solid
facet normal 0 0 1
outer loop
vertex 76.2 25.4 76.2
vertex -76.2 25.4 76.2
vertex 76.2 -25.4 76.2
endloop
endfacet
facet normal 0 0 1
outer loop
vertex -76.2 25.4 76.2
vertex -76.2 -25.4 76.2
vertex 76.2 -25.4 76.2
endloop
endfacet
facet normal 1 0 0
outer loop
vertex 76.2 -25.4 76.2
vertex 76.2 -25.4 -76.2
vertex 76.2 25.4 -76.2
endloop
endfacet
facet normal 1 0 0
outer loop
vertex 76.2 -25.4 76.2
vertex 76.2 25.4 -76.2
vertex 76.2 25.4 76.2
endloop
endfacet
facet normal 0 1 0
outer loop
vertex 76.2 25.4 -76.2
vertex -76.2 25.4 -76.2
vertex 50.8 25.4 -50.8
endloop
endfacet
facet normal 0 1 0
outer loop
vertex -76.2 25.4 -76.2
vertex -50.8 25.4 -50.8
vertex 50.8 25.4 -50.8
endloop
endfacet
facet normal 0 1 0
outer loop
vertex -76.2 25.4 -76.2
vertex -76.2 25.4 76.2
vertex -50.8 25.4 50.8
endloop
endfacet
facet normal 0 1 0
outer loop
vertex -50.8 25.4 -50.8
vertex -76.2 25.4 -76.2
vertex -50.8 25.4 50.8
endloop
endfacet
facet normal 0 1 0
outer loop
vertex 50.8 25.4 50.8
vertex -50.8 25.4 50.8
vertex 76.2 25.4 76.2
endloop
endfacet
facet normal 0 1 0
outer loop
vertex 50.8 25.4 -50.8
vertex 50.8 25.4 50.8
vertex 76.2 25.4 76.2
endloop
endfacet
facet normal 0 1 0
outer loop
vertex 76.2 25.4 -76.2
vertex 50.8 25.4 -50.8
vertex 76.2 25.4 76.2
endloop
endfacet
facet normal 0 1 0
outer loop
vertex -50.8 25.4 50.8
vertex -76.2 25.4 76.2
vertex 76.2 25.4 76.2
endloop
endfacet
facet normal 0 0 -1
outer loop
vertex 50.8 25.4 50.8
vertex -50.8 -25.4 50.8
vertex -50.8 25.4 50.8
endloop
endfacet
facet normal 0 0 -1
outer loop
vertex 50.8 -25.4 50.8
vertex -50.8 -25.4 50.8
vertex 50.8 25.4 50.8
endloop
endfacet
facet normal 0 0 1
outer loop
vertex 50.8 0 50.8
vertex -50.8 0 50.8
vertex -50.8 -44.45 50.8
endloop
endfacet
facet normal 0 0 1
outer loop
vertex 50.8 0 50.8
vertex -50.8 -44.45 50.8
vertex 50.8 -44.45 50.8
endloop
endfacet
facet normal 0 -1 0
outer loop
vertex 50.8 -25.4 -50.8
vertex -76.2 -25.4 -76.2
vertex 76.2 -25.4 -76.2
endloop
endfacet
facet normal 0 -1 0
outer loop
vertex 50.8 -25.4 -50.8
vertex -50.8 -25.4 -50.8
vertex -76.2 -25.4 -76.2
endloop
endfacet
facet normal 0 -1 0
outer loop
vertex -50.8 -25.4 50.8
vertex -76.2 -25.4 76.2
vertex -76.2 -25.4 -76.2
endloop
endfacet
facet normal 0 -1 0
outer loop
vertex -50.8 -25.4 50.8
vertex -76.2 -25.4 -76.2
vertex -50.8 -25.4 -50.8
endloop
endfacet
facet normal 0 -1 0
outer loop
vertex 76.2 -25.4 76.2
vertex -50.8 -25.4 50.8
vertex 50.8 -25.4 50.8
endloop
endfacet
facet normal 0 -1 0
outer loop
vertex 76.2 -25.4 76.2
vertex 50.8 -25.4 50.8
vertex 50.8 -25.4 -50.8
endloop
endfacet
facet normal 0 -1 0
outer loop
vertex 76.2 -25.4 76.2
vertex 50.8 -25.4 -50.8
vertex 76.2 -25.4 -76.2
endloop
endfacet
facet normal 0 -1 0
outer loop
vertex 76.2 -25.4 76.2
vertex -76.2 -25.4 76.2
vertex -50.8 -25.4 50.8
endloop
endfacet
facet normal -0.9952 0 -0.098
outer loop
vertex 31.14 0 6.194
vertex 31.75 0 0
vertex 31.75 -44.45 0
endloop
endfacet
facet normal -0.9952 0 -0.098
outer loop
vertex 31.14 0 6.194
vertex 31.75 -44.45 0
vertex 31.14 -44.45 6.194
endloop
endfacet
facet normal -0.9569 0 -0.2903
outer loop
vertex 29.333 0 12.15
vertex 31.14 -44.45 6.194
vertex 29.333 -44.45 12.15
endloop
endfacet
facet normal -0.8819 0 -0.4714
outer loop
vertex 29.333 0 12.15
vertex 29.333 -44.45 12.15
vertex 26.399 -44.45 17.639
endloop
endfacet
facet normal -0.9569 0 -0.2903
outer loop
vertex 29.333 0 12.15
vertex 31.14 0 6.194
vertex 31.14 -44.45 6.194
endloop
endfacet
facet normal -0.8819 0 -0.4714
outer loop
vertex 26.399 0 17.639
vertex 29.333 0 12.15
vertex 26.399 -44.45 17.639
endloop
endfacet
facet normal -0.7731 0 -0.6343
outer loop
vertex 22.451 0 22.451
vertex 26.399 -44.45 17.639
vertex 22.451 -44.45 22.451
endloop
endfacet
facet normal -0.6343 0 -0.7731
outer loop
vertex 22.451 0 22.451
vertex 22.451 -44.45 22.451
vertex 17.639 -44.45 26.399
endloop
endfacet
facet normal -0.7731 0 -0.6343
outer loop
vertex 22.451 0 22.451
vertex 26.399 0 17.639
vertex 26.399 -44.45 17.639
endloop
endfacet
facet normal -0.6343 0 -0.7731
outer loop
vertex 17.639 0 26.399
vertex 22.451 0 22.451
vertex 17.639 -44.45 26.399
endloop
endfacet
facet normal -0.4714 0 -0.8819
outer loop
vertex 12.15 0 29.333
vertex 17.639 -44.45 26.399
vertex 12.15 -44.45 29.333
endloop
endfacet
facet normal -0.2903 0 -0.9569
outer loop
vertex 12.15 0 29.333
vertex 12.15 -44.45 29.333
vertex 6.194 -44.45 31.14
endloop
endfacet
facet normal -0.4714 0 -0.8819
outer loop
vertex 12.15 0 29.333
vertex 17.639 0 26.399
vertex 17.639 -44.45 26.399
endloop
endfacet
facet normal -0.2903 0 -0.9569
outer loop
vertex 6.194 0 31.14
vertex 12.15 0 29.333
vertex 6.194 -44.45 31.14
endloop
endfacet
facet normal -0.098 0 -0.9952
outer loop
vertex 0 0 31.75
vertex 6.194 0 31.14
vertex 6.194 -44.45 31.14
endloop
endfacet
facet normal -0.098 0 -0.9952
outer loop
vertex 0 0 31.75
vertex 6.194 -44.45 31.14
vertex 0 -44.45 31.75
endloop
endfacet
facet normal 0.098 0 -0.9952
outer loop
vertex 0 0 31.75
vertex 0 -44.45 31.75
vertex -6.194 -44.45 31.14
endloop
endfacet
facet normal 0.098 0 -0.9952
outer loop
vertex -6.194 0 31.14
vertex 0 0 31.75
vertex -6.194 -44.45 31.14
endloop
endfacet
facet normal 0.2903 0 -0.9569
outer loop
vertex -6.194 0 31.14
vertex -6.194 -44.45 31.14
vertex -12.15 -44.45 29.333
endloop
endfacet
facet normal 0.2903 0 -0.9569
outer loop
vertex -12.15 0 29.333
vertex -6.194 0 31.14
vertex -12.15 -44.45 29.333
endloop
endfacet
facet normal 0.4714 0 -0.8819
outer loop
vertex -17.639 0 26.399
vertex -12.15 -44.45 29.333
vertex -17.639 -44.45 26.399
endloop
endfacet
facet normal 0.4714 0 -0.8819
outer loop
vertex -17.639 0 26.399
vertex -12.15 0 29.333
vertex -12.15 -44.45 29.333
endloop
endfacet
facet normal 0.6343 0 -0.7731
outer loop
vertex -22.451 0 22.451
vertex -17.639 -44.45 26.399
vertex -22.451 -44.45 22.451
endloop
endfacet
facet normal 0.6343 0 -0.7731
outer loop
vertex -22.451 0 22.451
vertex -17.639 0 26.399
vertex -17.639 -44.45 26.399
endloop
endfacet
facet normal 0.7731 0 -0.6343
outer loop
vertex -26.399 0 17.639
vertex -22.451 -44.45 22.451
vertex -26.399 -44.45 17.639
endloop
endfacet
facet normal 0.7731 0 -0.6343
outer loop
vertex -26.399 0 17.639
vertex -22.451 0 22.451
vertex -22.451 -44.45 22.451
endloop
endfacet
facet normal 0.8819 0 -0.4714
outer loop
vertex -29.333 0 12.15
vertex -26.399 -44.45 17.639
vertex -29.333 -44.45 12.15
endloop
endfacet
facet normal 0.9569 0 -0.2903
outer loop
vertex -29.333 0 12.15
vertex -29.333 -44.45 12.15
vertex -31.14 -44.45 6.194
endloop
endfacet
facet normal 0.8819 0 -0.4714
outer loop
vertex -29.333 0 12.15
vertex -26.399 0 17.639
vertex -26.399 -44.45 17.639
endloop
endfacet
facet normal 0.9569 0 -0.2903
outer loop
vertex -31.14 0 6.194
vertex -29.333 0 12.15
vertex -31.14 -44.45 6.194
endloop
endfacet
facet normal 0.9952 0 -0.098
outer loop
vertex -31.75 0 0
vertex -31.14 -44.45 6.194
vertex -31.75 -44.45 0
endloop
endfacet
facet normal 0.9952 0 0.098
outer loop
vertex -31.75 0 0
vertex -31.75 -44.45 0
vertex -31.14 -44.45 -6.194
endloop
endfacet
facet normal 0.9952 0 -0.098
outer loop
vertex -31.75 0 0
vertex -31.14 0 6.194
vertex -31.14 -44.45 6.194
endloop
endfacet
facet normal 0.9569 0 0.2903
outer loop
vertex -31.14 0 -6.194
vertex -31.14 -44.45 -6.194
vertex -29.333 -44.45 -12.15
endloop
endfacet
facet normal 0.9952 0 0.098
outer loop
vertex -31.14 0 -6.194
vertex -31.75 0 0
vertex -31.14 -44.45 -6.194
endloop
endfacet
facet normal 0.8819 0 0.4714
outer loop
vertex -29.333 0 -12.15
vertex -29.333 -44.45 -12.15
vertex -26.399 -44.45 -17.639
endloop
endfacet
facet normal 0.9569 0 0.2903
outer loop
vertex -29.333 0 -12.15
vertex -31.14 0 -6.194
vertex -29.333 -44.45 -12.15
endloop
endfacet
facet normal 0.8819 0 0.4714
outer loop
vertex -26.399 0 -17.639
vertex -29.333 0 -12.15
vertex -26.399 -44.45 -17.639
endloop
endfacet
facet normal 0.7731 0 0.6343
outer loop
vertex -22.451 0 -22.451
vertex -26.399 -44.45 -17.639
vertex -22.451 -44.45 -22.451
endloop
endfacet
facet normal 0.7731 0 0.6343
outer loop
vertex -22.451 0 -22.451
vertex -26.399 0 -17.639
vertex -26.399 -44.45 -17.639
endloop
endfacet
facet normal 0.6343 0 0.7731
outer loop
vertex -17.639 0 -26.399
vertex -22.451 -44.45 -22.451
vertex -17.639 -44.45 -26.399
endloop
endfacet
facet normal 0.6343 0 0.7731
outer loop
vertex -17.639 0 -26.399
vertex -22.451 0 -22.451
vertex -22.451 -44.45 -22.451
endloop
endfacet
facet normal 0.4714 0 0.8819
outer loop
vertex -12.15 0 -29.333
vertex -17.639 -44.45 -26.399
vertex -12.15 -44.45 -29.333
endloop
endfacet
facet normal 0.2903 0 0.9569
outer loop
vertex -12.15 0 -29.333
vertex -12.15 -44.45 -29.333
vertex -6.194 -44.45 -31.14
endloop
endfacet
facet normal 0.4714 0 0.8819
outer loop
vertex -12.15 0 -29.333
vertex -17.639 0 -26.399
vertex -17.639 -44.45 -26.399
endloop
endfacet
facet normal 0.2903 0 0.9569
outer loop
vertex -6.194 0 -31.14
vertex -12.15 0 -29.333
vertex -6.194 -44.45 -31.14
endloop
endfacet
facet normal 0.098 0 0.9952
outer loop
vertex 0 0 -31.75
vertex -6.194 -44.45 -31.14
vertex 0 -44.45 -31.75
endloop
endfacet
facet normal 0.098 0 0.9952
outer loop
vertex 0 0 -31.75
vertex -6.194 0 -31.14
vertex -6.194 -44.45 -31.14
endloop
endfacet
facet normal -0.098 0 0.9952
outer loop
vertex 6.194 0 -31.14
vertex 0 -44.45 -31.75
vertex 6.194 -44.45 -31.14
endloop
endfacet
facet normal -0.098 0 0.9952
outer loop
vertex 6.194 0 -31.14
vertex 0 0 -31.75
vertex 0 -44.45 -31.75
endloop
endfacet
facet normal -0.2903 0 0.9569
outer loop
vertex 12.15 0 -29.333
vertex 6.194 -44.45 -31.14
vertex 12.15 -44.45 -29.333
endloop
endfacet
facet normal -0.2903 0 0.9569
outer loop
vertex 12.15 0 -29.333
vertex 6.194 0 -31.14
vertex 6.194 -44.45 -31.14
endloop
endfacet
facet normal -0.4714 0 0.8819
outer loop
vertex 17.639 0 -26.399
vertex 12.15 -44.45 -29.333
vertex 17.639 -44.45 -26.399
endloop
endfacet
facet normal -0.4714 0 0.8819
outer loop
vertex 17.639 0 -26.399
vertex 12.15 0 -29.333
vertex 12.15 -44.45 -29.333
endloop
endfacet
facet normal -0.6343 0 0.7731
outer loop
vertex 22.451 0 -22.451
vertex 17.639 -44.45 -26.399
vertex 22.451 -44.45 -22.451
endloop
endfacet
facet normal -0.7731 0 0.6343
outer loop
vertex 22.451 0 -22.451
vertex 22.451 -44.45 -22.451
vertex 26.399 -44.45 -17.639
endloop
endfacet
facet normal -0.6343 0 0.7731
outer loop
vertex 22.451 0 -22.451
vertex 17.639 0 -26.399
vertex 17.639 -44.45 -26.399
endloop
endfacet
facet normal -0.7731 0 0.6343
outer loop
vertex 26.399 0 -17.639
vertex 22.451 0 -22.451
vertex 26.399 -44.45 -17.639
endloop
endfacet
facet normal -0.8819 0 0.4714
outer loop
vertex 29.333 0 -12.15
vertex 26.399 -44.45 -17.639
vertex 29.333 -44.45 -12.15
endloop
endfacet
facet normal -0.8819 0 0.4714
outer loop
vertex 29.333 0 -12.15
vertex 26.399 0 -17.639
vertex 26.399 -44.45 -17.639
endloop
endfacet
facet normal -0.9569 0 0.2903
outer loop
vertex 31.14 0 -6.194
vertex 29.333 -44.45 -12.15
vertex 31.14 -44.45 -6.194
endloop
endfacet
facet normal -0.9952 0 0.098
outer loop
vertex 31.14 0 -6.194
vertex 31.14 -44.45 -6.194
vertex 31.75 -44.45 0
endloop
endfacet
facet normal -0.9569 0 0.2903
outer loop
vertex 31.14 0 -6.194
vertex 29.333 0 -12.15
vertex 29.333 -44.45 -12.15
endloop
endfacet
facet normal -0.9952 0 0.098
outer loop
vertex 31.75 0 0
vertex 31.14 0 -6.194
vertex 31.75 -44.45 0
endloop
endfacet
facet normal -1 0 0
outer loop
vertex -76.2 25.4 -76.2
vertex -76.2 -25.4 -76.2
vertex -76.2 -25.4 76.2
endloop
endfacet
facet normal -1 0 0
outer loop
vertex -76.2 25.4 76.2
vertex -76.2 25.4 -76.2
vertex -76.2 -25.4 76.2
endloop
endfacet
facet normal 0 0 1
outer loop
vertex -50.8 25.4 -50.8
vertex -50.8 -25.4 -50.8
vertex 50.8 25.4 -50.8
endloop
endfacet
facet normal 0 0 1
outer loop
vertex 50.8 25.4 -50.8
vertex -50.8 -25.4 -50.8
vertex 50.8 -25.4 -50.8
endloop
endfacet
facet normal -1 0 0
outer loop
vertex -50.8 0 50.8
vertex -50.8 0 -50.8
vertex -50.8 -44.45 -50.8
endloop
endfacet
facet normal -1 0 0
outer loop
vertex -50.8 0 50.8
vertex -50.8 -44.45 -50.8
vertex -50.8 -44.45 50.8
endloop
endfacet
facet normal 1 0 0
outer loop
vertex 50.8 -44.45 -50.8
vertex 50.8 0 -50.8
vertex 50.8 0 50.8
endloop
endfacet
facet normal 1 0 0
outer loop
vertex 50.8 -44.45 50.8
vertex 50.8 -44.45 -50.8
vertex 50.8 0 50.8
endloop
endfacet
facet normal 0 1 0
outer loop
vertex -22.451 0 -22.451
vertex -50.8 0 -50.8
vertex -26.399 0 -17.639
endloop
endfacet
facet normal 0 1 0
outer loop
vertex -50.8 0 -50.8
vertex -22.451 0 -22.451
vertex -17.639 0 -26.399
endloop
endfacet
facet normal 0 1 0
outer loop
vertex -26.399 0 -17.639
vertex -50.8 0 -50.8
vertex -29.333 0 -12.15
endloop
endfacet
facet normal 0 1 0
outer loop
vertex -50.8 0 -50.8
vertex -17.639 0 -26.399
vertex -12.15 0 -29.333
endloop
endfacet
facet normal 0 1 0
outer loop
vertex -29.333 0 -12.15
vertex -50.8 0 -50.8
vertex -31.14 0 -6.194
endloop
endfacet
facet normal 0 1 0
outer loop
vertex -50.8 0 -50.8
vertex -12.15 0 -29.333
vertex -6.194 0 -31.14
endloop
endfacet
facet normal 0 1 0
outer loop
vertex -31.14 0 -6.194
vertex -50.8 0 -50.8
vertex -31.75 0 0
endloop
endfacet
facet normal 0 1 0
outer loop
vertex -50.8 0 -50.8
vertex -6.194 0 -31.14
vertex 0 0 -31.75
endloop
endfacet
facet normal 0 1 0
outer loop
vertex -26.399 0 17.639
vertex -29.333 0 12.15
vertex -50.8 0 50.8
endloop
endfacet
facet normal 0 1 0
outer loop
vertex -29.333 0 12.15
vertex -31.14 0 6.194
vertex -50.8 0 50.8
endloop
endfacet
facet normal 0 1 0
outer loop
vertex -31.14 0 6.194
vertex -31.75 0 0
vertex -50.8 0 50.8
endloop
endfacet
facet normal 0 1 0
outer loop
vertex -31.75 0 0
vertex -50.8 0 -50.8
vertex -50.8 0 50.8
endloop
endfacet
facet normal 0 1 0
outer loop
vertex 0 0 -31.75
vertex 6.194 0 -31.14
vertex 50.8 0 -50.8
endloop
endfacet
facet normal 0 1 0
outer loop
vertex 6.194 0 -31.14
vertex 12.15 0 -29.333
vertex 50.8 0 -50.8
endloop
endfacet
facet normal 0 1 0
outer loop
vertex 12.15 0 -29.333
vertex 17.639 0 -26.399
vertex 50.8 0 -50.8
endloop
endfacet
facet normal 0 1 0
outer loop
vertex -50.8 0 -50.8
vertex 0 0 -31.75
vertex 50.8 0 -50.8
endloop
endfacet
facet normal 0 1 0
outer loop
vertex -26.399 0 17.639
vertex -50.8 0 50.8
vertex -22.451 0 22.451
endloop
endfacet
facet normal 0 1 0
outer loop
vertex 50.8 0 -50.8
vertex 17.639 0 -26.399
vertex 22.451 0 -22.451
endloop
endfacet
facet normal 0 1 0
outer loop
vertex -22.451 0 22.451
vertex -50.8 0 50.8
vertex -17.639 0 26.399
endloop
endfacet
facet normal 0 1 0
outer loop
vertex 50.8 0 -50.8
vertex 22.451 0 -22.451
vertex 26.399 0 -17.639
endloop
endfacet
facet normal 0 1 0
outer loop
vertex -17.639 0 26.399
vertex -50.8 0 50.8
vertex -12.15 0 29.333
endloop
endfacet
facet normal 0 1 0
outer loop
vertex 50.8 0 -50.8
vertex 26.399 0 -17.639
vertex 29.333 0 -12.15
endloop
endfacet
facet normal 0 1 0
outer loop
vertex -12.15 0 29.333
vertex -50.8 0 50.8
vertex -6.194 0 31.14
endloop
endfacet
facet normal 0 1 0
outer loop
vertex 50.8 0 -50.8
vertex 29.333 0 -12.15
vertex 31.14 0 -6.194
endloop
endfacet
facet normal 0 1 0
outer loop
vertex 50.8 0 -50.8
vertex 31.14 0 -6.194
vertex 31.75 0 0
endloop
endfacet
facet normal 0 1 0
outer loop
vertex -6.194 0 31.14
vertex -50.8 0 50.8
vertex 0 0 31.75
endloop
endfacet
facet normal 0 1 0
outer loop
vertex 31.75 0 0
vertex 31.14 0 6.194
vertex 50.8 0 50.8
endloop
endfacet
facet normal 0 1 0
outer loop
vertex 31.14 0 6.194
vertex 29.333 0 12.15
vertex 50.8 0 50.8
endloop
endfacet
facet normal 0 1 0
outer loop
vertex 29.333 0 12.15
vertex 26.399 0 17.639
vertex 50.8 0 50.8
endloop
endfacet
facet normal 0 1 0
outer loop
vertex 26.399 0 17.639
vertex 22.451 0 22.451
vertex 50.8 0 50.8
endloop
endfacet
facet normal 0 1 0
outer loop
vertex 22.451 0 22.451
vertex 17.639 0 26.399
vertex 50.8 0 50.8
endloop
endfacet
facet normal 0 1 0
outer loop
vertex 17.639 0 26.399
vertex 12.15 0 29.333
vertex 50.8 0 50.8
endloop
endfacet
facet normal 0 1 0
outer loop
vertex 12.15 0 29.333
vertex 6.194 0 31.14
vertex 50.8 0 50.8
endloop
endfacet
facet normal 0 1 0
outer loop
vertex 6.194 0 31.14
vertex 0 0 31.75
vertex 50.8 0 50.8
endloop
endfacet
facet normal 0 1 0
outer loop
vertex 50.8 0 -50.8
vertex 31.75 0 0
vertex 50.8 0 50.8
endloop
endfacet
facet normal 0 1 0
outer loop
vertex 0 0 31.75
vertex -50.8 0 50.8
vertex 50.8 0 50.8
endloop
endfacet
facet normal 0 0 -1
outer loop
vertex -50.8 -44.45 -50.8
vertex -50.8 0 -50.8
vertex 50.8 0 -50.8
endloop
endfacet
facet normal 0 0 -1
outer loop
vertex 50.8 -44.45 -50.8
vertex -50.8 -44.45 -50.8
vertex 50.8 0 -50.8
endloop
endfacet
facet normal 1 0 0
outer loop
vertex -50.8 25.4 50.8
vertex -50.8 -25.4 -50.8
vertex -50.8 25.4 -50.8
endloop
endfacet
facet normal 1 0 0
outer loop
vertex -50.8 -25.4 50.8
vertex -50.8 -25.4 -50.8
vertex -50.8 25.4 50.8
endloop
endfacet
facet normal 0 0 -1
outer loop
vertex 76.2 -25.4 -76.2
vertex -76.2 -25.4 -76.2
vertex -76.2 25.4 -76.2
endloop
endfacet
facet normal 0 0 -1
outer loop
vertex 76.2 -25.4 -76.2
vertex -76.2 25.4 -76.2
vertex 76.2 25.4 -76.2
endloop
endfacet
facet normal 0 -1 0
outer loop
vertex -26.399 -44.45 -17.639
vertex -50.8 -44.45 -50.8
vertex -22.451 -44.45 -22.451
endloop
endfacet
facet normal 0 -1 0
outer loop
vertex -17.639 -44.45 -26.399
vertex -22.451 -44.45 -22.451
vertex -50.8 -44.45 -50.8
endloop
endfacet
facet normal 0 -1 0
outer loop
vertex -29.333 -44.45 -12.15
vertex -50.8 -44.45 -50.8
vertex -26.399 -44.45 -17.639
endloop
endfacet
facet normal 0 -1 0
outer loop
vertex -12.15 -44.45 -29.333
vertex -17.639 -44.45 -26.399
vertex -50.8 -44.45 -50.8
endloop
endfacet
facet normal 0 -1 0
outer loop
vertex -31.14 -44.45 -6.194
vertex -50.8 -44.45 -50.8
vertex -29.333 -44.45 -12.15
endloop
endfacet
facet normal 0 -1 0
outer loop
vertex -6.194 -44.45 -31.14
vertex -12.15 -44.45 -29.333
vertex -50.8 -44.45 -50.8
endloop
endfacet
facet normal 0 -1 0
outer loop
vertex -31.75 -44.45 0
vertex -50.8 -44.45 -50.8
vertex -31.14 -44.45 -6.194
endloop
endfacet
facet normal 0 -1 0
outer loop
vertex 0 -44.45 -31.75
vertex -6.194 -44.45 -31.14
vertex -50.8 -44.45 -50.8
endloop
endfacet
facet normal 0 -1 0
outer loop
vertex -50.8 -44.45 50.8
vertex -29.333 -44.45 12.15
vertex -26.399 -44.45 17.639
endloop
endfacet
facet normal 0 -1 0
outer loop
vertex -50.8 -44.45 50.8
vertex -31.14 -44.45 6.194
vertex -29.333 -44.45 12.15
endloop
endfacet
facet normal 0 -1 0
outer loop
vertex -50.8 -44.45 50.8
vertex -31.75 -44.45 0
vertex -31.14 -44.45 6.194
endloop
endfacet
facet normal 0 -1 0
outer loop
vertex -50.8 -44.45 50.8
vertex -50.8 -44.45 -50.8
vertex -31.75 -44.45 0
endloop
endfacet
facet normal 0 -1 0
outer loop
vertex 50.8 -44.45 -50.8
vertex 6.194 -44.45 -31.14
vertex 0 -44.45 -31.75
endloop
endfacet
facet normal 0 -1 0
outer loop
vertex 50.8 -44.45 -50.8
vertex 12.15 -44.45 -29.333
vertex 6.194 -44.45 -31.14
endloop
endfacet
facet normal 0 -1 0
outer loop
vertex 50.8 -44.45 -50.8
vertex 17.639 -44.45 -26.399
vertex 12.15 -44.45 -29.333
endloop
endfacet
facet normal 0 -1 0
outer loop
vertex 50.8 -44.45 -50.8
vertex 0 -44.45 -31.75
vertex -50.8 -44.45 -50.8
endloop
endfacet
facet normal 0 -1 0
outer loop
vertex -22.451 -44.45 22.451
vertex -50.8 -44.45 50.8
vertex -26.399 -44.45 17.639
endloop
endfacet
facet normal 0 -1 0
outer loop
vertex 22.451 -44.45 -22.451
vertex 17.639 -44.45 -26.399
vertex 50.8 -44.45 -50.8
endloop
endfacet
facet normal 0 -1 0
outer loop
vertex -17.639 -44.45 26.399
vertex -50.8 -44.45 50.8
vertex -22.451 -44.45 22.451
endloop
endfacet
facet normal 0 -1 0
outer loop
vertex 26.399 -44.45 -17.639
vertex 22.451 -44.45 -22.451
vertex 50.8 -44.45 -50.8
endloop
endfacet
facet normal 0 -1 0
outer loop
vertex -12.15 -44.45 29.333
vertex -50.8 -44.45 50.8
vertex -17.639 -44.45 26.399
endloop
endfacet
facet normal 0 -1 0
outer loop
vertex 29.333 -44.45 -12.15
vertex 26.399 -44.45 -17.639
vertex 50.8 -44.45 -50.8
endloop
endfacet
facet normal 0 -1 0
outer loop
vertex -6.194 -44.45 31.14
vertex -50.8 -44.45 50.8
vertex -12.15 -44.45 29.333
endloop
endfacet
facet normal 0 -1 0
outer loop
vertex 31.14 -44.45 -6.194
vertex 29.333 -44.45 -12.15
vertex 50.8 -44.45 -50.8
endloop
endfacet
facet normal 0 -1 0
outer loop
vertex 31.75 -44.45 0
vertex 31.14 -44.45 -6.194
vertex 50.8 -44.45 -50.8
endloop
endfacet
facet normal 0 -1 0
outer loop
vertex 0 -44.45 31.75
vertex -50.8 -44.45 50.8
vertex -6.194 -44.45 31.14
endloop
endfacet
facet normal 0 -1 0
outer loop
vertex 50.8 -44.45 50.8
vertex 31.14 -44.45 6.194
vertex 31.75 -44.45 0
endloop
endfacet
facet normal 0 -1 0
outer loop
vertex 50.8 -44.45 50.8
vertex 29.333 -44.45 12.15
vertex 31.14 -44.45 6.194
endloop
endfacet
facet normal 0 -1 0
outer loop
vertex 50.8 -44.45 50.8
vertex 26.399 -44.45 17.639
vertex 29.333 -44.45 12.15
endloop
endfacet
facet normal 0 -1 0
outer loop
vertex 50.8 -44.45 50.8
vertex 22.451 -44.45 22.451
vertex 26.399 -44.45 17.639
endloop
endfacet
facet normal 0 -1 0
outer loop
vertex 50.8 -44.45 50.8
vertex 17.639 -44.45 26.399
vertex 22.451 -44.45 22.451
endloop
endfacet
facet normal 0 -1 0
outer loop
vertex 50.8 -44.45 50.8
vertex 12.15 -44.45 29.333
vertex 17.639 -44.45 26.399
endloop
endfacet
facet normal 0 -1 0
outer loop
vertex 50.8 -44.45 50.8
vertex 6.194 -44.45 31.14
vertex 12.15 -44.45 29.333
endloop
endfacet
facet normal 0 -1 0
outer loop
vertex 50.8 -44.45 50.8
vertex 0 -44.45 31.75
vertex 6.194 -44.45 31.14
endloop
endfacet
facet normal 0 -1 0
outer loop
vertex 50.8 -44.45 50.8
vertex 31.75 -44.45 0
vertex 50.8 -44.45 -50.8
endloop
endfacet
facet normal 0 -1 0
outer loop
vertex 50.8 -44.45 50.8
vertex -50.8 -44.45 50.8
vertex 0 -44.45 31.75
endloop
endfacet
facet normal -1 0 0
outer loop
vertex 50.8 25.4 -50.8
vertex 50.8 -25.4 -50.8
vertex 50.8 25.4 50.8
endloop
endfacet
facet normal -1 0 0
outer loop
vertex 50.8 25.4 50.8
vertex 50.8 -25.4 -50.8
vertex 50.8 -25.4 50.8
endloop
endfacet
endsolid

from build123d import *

# Parameters (mm, degrees)
F0_W     = 101.6
F0_H     = 101.6
F0_R     = 31.75
F1_DEPTH = 44.45
F0_W_2   = 152.4
F0_H_2   = 152.4
F2_DEPTH = 25.4


with BuildPart() as f1:
    # F0 (on Front) → F1 (new body)
    with BuildSketch(Plane.XZ):
        Rectangle(F0_W, F0_H)
        Circle(F0_R, mode=Mode.SUBTRACT)
    extrude(amount=F1_DEPTH)


with BuildPart() as f2:
    # F0 (on Front) → F2 (new body, symmetric)
    with BuildSketch(Plane.XZ):
        Rectangle(F0_W_2, F0_H_2)
        Rectangle(F0_W, F0_H, mode=Mode.SUBTRACT)
    extrude(amount=F2_DEPTH, both=True)


solid = Compound([f1.part, f2.part])
